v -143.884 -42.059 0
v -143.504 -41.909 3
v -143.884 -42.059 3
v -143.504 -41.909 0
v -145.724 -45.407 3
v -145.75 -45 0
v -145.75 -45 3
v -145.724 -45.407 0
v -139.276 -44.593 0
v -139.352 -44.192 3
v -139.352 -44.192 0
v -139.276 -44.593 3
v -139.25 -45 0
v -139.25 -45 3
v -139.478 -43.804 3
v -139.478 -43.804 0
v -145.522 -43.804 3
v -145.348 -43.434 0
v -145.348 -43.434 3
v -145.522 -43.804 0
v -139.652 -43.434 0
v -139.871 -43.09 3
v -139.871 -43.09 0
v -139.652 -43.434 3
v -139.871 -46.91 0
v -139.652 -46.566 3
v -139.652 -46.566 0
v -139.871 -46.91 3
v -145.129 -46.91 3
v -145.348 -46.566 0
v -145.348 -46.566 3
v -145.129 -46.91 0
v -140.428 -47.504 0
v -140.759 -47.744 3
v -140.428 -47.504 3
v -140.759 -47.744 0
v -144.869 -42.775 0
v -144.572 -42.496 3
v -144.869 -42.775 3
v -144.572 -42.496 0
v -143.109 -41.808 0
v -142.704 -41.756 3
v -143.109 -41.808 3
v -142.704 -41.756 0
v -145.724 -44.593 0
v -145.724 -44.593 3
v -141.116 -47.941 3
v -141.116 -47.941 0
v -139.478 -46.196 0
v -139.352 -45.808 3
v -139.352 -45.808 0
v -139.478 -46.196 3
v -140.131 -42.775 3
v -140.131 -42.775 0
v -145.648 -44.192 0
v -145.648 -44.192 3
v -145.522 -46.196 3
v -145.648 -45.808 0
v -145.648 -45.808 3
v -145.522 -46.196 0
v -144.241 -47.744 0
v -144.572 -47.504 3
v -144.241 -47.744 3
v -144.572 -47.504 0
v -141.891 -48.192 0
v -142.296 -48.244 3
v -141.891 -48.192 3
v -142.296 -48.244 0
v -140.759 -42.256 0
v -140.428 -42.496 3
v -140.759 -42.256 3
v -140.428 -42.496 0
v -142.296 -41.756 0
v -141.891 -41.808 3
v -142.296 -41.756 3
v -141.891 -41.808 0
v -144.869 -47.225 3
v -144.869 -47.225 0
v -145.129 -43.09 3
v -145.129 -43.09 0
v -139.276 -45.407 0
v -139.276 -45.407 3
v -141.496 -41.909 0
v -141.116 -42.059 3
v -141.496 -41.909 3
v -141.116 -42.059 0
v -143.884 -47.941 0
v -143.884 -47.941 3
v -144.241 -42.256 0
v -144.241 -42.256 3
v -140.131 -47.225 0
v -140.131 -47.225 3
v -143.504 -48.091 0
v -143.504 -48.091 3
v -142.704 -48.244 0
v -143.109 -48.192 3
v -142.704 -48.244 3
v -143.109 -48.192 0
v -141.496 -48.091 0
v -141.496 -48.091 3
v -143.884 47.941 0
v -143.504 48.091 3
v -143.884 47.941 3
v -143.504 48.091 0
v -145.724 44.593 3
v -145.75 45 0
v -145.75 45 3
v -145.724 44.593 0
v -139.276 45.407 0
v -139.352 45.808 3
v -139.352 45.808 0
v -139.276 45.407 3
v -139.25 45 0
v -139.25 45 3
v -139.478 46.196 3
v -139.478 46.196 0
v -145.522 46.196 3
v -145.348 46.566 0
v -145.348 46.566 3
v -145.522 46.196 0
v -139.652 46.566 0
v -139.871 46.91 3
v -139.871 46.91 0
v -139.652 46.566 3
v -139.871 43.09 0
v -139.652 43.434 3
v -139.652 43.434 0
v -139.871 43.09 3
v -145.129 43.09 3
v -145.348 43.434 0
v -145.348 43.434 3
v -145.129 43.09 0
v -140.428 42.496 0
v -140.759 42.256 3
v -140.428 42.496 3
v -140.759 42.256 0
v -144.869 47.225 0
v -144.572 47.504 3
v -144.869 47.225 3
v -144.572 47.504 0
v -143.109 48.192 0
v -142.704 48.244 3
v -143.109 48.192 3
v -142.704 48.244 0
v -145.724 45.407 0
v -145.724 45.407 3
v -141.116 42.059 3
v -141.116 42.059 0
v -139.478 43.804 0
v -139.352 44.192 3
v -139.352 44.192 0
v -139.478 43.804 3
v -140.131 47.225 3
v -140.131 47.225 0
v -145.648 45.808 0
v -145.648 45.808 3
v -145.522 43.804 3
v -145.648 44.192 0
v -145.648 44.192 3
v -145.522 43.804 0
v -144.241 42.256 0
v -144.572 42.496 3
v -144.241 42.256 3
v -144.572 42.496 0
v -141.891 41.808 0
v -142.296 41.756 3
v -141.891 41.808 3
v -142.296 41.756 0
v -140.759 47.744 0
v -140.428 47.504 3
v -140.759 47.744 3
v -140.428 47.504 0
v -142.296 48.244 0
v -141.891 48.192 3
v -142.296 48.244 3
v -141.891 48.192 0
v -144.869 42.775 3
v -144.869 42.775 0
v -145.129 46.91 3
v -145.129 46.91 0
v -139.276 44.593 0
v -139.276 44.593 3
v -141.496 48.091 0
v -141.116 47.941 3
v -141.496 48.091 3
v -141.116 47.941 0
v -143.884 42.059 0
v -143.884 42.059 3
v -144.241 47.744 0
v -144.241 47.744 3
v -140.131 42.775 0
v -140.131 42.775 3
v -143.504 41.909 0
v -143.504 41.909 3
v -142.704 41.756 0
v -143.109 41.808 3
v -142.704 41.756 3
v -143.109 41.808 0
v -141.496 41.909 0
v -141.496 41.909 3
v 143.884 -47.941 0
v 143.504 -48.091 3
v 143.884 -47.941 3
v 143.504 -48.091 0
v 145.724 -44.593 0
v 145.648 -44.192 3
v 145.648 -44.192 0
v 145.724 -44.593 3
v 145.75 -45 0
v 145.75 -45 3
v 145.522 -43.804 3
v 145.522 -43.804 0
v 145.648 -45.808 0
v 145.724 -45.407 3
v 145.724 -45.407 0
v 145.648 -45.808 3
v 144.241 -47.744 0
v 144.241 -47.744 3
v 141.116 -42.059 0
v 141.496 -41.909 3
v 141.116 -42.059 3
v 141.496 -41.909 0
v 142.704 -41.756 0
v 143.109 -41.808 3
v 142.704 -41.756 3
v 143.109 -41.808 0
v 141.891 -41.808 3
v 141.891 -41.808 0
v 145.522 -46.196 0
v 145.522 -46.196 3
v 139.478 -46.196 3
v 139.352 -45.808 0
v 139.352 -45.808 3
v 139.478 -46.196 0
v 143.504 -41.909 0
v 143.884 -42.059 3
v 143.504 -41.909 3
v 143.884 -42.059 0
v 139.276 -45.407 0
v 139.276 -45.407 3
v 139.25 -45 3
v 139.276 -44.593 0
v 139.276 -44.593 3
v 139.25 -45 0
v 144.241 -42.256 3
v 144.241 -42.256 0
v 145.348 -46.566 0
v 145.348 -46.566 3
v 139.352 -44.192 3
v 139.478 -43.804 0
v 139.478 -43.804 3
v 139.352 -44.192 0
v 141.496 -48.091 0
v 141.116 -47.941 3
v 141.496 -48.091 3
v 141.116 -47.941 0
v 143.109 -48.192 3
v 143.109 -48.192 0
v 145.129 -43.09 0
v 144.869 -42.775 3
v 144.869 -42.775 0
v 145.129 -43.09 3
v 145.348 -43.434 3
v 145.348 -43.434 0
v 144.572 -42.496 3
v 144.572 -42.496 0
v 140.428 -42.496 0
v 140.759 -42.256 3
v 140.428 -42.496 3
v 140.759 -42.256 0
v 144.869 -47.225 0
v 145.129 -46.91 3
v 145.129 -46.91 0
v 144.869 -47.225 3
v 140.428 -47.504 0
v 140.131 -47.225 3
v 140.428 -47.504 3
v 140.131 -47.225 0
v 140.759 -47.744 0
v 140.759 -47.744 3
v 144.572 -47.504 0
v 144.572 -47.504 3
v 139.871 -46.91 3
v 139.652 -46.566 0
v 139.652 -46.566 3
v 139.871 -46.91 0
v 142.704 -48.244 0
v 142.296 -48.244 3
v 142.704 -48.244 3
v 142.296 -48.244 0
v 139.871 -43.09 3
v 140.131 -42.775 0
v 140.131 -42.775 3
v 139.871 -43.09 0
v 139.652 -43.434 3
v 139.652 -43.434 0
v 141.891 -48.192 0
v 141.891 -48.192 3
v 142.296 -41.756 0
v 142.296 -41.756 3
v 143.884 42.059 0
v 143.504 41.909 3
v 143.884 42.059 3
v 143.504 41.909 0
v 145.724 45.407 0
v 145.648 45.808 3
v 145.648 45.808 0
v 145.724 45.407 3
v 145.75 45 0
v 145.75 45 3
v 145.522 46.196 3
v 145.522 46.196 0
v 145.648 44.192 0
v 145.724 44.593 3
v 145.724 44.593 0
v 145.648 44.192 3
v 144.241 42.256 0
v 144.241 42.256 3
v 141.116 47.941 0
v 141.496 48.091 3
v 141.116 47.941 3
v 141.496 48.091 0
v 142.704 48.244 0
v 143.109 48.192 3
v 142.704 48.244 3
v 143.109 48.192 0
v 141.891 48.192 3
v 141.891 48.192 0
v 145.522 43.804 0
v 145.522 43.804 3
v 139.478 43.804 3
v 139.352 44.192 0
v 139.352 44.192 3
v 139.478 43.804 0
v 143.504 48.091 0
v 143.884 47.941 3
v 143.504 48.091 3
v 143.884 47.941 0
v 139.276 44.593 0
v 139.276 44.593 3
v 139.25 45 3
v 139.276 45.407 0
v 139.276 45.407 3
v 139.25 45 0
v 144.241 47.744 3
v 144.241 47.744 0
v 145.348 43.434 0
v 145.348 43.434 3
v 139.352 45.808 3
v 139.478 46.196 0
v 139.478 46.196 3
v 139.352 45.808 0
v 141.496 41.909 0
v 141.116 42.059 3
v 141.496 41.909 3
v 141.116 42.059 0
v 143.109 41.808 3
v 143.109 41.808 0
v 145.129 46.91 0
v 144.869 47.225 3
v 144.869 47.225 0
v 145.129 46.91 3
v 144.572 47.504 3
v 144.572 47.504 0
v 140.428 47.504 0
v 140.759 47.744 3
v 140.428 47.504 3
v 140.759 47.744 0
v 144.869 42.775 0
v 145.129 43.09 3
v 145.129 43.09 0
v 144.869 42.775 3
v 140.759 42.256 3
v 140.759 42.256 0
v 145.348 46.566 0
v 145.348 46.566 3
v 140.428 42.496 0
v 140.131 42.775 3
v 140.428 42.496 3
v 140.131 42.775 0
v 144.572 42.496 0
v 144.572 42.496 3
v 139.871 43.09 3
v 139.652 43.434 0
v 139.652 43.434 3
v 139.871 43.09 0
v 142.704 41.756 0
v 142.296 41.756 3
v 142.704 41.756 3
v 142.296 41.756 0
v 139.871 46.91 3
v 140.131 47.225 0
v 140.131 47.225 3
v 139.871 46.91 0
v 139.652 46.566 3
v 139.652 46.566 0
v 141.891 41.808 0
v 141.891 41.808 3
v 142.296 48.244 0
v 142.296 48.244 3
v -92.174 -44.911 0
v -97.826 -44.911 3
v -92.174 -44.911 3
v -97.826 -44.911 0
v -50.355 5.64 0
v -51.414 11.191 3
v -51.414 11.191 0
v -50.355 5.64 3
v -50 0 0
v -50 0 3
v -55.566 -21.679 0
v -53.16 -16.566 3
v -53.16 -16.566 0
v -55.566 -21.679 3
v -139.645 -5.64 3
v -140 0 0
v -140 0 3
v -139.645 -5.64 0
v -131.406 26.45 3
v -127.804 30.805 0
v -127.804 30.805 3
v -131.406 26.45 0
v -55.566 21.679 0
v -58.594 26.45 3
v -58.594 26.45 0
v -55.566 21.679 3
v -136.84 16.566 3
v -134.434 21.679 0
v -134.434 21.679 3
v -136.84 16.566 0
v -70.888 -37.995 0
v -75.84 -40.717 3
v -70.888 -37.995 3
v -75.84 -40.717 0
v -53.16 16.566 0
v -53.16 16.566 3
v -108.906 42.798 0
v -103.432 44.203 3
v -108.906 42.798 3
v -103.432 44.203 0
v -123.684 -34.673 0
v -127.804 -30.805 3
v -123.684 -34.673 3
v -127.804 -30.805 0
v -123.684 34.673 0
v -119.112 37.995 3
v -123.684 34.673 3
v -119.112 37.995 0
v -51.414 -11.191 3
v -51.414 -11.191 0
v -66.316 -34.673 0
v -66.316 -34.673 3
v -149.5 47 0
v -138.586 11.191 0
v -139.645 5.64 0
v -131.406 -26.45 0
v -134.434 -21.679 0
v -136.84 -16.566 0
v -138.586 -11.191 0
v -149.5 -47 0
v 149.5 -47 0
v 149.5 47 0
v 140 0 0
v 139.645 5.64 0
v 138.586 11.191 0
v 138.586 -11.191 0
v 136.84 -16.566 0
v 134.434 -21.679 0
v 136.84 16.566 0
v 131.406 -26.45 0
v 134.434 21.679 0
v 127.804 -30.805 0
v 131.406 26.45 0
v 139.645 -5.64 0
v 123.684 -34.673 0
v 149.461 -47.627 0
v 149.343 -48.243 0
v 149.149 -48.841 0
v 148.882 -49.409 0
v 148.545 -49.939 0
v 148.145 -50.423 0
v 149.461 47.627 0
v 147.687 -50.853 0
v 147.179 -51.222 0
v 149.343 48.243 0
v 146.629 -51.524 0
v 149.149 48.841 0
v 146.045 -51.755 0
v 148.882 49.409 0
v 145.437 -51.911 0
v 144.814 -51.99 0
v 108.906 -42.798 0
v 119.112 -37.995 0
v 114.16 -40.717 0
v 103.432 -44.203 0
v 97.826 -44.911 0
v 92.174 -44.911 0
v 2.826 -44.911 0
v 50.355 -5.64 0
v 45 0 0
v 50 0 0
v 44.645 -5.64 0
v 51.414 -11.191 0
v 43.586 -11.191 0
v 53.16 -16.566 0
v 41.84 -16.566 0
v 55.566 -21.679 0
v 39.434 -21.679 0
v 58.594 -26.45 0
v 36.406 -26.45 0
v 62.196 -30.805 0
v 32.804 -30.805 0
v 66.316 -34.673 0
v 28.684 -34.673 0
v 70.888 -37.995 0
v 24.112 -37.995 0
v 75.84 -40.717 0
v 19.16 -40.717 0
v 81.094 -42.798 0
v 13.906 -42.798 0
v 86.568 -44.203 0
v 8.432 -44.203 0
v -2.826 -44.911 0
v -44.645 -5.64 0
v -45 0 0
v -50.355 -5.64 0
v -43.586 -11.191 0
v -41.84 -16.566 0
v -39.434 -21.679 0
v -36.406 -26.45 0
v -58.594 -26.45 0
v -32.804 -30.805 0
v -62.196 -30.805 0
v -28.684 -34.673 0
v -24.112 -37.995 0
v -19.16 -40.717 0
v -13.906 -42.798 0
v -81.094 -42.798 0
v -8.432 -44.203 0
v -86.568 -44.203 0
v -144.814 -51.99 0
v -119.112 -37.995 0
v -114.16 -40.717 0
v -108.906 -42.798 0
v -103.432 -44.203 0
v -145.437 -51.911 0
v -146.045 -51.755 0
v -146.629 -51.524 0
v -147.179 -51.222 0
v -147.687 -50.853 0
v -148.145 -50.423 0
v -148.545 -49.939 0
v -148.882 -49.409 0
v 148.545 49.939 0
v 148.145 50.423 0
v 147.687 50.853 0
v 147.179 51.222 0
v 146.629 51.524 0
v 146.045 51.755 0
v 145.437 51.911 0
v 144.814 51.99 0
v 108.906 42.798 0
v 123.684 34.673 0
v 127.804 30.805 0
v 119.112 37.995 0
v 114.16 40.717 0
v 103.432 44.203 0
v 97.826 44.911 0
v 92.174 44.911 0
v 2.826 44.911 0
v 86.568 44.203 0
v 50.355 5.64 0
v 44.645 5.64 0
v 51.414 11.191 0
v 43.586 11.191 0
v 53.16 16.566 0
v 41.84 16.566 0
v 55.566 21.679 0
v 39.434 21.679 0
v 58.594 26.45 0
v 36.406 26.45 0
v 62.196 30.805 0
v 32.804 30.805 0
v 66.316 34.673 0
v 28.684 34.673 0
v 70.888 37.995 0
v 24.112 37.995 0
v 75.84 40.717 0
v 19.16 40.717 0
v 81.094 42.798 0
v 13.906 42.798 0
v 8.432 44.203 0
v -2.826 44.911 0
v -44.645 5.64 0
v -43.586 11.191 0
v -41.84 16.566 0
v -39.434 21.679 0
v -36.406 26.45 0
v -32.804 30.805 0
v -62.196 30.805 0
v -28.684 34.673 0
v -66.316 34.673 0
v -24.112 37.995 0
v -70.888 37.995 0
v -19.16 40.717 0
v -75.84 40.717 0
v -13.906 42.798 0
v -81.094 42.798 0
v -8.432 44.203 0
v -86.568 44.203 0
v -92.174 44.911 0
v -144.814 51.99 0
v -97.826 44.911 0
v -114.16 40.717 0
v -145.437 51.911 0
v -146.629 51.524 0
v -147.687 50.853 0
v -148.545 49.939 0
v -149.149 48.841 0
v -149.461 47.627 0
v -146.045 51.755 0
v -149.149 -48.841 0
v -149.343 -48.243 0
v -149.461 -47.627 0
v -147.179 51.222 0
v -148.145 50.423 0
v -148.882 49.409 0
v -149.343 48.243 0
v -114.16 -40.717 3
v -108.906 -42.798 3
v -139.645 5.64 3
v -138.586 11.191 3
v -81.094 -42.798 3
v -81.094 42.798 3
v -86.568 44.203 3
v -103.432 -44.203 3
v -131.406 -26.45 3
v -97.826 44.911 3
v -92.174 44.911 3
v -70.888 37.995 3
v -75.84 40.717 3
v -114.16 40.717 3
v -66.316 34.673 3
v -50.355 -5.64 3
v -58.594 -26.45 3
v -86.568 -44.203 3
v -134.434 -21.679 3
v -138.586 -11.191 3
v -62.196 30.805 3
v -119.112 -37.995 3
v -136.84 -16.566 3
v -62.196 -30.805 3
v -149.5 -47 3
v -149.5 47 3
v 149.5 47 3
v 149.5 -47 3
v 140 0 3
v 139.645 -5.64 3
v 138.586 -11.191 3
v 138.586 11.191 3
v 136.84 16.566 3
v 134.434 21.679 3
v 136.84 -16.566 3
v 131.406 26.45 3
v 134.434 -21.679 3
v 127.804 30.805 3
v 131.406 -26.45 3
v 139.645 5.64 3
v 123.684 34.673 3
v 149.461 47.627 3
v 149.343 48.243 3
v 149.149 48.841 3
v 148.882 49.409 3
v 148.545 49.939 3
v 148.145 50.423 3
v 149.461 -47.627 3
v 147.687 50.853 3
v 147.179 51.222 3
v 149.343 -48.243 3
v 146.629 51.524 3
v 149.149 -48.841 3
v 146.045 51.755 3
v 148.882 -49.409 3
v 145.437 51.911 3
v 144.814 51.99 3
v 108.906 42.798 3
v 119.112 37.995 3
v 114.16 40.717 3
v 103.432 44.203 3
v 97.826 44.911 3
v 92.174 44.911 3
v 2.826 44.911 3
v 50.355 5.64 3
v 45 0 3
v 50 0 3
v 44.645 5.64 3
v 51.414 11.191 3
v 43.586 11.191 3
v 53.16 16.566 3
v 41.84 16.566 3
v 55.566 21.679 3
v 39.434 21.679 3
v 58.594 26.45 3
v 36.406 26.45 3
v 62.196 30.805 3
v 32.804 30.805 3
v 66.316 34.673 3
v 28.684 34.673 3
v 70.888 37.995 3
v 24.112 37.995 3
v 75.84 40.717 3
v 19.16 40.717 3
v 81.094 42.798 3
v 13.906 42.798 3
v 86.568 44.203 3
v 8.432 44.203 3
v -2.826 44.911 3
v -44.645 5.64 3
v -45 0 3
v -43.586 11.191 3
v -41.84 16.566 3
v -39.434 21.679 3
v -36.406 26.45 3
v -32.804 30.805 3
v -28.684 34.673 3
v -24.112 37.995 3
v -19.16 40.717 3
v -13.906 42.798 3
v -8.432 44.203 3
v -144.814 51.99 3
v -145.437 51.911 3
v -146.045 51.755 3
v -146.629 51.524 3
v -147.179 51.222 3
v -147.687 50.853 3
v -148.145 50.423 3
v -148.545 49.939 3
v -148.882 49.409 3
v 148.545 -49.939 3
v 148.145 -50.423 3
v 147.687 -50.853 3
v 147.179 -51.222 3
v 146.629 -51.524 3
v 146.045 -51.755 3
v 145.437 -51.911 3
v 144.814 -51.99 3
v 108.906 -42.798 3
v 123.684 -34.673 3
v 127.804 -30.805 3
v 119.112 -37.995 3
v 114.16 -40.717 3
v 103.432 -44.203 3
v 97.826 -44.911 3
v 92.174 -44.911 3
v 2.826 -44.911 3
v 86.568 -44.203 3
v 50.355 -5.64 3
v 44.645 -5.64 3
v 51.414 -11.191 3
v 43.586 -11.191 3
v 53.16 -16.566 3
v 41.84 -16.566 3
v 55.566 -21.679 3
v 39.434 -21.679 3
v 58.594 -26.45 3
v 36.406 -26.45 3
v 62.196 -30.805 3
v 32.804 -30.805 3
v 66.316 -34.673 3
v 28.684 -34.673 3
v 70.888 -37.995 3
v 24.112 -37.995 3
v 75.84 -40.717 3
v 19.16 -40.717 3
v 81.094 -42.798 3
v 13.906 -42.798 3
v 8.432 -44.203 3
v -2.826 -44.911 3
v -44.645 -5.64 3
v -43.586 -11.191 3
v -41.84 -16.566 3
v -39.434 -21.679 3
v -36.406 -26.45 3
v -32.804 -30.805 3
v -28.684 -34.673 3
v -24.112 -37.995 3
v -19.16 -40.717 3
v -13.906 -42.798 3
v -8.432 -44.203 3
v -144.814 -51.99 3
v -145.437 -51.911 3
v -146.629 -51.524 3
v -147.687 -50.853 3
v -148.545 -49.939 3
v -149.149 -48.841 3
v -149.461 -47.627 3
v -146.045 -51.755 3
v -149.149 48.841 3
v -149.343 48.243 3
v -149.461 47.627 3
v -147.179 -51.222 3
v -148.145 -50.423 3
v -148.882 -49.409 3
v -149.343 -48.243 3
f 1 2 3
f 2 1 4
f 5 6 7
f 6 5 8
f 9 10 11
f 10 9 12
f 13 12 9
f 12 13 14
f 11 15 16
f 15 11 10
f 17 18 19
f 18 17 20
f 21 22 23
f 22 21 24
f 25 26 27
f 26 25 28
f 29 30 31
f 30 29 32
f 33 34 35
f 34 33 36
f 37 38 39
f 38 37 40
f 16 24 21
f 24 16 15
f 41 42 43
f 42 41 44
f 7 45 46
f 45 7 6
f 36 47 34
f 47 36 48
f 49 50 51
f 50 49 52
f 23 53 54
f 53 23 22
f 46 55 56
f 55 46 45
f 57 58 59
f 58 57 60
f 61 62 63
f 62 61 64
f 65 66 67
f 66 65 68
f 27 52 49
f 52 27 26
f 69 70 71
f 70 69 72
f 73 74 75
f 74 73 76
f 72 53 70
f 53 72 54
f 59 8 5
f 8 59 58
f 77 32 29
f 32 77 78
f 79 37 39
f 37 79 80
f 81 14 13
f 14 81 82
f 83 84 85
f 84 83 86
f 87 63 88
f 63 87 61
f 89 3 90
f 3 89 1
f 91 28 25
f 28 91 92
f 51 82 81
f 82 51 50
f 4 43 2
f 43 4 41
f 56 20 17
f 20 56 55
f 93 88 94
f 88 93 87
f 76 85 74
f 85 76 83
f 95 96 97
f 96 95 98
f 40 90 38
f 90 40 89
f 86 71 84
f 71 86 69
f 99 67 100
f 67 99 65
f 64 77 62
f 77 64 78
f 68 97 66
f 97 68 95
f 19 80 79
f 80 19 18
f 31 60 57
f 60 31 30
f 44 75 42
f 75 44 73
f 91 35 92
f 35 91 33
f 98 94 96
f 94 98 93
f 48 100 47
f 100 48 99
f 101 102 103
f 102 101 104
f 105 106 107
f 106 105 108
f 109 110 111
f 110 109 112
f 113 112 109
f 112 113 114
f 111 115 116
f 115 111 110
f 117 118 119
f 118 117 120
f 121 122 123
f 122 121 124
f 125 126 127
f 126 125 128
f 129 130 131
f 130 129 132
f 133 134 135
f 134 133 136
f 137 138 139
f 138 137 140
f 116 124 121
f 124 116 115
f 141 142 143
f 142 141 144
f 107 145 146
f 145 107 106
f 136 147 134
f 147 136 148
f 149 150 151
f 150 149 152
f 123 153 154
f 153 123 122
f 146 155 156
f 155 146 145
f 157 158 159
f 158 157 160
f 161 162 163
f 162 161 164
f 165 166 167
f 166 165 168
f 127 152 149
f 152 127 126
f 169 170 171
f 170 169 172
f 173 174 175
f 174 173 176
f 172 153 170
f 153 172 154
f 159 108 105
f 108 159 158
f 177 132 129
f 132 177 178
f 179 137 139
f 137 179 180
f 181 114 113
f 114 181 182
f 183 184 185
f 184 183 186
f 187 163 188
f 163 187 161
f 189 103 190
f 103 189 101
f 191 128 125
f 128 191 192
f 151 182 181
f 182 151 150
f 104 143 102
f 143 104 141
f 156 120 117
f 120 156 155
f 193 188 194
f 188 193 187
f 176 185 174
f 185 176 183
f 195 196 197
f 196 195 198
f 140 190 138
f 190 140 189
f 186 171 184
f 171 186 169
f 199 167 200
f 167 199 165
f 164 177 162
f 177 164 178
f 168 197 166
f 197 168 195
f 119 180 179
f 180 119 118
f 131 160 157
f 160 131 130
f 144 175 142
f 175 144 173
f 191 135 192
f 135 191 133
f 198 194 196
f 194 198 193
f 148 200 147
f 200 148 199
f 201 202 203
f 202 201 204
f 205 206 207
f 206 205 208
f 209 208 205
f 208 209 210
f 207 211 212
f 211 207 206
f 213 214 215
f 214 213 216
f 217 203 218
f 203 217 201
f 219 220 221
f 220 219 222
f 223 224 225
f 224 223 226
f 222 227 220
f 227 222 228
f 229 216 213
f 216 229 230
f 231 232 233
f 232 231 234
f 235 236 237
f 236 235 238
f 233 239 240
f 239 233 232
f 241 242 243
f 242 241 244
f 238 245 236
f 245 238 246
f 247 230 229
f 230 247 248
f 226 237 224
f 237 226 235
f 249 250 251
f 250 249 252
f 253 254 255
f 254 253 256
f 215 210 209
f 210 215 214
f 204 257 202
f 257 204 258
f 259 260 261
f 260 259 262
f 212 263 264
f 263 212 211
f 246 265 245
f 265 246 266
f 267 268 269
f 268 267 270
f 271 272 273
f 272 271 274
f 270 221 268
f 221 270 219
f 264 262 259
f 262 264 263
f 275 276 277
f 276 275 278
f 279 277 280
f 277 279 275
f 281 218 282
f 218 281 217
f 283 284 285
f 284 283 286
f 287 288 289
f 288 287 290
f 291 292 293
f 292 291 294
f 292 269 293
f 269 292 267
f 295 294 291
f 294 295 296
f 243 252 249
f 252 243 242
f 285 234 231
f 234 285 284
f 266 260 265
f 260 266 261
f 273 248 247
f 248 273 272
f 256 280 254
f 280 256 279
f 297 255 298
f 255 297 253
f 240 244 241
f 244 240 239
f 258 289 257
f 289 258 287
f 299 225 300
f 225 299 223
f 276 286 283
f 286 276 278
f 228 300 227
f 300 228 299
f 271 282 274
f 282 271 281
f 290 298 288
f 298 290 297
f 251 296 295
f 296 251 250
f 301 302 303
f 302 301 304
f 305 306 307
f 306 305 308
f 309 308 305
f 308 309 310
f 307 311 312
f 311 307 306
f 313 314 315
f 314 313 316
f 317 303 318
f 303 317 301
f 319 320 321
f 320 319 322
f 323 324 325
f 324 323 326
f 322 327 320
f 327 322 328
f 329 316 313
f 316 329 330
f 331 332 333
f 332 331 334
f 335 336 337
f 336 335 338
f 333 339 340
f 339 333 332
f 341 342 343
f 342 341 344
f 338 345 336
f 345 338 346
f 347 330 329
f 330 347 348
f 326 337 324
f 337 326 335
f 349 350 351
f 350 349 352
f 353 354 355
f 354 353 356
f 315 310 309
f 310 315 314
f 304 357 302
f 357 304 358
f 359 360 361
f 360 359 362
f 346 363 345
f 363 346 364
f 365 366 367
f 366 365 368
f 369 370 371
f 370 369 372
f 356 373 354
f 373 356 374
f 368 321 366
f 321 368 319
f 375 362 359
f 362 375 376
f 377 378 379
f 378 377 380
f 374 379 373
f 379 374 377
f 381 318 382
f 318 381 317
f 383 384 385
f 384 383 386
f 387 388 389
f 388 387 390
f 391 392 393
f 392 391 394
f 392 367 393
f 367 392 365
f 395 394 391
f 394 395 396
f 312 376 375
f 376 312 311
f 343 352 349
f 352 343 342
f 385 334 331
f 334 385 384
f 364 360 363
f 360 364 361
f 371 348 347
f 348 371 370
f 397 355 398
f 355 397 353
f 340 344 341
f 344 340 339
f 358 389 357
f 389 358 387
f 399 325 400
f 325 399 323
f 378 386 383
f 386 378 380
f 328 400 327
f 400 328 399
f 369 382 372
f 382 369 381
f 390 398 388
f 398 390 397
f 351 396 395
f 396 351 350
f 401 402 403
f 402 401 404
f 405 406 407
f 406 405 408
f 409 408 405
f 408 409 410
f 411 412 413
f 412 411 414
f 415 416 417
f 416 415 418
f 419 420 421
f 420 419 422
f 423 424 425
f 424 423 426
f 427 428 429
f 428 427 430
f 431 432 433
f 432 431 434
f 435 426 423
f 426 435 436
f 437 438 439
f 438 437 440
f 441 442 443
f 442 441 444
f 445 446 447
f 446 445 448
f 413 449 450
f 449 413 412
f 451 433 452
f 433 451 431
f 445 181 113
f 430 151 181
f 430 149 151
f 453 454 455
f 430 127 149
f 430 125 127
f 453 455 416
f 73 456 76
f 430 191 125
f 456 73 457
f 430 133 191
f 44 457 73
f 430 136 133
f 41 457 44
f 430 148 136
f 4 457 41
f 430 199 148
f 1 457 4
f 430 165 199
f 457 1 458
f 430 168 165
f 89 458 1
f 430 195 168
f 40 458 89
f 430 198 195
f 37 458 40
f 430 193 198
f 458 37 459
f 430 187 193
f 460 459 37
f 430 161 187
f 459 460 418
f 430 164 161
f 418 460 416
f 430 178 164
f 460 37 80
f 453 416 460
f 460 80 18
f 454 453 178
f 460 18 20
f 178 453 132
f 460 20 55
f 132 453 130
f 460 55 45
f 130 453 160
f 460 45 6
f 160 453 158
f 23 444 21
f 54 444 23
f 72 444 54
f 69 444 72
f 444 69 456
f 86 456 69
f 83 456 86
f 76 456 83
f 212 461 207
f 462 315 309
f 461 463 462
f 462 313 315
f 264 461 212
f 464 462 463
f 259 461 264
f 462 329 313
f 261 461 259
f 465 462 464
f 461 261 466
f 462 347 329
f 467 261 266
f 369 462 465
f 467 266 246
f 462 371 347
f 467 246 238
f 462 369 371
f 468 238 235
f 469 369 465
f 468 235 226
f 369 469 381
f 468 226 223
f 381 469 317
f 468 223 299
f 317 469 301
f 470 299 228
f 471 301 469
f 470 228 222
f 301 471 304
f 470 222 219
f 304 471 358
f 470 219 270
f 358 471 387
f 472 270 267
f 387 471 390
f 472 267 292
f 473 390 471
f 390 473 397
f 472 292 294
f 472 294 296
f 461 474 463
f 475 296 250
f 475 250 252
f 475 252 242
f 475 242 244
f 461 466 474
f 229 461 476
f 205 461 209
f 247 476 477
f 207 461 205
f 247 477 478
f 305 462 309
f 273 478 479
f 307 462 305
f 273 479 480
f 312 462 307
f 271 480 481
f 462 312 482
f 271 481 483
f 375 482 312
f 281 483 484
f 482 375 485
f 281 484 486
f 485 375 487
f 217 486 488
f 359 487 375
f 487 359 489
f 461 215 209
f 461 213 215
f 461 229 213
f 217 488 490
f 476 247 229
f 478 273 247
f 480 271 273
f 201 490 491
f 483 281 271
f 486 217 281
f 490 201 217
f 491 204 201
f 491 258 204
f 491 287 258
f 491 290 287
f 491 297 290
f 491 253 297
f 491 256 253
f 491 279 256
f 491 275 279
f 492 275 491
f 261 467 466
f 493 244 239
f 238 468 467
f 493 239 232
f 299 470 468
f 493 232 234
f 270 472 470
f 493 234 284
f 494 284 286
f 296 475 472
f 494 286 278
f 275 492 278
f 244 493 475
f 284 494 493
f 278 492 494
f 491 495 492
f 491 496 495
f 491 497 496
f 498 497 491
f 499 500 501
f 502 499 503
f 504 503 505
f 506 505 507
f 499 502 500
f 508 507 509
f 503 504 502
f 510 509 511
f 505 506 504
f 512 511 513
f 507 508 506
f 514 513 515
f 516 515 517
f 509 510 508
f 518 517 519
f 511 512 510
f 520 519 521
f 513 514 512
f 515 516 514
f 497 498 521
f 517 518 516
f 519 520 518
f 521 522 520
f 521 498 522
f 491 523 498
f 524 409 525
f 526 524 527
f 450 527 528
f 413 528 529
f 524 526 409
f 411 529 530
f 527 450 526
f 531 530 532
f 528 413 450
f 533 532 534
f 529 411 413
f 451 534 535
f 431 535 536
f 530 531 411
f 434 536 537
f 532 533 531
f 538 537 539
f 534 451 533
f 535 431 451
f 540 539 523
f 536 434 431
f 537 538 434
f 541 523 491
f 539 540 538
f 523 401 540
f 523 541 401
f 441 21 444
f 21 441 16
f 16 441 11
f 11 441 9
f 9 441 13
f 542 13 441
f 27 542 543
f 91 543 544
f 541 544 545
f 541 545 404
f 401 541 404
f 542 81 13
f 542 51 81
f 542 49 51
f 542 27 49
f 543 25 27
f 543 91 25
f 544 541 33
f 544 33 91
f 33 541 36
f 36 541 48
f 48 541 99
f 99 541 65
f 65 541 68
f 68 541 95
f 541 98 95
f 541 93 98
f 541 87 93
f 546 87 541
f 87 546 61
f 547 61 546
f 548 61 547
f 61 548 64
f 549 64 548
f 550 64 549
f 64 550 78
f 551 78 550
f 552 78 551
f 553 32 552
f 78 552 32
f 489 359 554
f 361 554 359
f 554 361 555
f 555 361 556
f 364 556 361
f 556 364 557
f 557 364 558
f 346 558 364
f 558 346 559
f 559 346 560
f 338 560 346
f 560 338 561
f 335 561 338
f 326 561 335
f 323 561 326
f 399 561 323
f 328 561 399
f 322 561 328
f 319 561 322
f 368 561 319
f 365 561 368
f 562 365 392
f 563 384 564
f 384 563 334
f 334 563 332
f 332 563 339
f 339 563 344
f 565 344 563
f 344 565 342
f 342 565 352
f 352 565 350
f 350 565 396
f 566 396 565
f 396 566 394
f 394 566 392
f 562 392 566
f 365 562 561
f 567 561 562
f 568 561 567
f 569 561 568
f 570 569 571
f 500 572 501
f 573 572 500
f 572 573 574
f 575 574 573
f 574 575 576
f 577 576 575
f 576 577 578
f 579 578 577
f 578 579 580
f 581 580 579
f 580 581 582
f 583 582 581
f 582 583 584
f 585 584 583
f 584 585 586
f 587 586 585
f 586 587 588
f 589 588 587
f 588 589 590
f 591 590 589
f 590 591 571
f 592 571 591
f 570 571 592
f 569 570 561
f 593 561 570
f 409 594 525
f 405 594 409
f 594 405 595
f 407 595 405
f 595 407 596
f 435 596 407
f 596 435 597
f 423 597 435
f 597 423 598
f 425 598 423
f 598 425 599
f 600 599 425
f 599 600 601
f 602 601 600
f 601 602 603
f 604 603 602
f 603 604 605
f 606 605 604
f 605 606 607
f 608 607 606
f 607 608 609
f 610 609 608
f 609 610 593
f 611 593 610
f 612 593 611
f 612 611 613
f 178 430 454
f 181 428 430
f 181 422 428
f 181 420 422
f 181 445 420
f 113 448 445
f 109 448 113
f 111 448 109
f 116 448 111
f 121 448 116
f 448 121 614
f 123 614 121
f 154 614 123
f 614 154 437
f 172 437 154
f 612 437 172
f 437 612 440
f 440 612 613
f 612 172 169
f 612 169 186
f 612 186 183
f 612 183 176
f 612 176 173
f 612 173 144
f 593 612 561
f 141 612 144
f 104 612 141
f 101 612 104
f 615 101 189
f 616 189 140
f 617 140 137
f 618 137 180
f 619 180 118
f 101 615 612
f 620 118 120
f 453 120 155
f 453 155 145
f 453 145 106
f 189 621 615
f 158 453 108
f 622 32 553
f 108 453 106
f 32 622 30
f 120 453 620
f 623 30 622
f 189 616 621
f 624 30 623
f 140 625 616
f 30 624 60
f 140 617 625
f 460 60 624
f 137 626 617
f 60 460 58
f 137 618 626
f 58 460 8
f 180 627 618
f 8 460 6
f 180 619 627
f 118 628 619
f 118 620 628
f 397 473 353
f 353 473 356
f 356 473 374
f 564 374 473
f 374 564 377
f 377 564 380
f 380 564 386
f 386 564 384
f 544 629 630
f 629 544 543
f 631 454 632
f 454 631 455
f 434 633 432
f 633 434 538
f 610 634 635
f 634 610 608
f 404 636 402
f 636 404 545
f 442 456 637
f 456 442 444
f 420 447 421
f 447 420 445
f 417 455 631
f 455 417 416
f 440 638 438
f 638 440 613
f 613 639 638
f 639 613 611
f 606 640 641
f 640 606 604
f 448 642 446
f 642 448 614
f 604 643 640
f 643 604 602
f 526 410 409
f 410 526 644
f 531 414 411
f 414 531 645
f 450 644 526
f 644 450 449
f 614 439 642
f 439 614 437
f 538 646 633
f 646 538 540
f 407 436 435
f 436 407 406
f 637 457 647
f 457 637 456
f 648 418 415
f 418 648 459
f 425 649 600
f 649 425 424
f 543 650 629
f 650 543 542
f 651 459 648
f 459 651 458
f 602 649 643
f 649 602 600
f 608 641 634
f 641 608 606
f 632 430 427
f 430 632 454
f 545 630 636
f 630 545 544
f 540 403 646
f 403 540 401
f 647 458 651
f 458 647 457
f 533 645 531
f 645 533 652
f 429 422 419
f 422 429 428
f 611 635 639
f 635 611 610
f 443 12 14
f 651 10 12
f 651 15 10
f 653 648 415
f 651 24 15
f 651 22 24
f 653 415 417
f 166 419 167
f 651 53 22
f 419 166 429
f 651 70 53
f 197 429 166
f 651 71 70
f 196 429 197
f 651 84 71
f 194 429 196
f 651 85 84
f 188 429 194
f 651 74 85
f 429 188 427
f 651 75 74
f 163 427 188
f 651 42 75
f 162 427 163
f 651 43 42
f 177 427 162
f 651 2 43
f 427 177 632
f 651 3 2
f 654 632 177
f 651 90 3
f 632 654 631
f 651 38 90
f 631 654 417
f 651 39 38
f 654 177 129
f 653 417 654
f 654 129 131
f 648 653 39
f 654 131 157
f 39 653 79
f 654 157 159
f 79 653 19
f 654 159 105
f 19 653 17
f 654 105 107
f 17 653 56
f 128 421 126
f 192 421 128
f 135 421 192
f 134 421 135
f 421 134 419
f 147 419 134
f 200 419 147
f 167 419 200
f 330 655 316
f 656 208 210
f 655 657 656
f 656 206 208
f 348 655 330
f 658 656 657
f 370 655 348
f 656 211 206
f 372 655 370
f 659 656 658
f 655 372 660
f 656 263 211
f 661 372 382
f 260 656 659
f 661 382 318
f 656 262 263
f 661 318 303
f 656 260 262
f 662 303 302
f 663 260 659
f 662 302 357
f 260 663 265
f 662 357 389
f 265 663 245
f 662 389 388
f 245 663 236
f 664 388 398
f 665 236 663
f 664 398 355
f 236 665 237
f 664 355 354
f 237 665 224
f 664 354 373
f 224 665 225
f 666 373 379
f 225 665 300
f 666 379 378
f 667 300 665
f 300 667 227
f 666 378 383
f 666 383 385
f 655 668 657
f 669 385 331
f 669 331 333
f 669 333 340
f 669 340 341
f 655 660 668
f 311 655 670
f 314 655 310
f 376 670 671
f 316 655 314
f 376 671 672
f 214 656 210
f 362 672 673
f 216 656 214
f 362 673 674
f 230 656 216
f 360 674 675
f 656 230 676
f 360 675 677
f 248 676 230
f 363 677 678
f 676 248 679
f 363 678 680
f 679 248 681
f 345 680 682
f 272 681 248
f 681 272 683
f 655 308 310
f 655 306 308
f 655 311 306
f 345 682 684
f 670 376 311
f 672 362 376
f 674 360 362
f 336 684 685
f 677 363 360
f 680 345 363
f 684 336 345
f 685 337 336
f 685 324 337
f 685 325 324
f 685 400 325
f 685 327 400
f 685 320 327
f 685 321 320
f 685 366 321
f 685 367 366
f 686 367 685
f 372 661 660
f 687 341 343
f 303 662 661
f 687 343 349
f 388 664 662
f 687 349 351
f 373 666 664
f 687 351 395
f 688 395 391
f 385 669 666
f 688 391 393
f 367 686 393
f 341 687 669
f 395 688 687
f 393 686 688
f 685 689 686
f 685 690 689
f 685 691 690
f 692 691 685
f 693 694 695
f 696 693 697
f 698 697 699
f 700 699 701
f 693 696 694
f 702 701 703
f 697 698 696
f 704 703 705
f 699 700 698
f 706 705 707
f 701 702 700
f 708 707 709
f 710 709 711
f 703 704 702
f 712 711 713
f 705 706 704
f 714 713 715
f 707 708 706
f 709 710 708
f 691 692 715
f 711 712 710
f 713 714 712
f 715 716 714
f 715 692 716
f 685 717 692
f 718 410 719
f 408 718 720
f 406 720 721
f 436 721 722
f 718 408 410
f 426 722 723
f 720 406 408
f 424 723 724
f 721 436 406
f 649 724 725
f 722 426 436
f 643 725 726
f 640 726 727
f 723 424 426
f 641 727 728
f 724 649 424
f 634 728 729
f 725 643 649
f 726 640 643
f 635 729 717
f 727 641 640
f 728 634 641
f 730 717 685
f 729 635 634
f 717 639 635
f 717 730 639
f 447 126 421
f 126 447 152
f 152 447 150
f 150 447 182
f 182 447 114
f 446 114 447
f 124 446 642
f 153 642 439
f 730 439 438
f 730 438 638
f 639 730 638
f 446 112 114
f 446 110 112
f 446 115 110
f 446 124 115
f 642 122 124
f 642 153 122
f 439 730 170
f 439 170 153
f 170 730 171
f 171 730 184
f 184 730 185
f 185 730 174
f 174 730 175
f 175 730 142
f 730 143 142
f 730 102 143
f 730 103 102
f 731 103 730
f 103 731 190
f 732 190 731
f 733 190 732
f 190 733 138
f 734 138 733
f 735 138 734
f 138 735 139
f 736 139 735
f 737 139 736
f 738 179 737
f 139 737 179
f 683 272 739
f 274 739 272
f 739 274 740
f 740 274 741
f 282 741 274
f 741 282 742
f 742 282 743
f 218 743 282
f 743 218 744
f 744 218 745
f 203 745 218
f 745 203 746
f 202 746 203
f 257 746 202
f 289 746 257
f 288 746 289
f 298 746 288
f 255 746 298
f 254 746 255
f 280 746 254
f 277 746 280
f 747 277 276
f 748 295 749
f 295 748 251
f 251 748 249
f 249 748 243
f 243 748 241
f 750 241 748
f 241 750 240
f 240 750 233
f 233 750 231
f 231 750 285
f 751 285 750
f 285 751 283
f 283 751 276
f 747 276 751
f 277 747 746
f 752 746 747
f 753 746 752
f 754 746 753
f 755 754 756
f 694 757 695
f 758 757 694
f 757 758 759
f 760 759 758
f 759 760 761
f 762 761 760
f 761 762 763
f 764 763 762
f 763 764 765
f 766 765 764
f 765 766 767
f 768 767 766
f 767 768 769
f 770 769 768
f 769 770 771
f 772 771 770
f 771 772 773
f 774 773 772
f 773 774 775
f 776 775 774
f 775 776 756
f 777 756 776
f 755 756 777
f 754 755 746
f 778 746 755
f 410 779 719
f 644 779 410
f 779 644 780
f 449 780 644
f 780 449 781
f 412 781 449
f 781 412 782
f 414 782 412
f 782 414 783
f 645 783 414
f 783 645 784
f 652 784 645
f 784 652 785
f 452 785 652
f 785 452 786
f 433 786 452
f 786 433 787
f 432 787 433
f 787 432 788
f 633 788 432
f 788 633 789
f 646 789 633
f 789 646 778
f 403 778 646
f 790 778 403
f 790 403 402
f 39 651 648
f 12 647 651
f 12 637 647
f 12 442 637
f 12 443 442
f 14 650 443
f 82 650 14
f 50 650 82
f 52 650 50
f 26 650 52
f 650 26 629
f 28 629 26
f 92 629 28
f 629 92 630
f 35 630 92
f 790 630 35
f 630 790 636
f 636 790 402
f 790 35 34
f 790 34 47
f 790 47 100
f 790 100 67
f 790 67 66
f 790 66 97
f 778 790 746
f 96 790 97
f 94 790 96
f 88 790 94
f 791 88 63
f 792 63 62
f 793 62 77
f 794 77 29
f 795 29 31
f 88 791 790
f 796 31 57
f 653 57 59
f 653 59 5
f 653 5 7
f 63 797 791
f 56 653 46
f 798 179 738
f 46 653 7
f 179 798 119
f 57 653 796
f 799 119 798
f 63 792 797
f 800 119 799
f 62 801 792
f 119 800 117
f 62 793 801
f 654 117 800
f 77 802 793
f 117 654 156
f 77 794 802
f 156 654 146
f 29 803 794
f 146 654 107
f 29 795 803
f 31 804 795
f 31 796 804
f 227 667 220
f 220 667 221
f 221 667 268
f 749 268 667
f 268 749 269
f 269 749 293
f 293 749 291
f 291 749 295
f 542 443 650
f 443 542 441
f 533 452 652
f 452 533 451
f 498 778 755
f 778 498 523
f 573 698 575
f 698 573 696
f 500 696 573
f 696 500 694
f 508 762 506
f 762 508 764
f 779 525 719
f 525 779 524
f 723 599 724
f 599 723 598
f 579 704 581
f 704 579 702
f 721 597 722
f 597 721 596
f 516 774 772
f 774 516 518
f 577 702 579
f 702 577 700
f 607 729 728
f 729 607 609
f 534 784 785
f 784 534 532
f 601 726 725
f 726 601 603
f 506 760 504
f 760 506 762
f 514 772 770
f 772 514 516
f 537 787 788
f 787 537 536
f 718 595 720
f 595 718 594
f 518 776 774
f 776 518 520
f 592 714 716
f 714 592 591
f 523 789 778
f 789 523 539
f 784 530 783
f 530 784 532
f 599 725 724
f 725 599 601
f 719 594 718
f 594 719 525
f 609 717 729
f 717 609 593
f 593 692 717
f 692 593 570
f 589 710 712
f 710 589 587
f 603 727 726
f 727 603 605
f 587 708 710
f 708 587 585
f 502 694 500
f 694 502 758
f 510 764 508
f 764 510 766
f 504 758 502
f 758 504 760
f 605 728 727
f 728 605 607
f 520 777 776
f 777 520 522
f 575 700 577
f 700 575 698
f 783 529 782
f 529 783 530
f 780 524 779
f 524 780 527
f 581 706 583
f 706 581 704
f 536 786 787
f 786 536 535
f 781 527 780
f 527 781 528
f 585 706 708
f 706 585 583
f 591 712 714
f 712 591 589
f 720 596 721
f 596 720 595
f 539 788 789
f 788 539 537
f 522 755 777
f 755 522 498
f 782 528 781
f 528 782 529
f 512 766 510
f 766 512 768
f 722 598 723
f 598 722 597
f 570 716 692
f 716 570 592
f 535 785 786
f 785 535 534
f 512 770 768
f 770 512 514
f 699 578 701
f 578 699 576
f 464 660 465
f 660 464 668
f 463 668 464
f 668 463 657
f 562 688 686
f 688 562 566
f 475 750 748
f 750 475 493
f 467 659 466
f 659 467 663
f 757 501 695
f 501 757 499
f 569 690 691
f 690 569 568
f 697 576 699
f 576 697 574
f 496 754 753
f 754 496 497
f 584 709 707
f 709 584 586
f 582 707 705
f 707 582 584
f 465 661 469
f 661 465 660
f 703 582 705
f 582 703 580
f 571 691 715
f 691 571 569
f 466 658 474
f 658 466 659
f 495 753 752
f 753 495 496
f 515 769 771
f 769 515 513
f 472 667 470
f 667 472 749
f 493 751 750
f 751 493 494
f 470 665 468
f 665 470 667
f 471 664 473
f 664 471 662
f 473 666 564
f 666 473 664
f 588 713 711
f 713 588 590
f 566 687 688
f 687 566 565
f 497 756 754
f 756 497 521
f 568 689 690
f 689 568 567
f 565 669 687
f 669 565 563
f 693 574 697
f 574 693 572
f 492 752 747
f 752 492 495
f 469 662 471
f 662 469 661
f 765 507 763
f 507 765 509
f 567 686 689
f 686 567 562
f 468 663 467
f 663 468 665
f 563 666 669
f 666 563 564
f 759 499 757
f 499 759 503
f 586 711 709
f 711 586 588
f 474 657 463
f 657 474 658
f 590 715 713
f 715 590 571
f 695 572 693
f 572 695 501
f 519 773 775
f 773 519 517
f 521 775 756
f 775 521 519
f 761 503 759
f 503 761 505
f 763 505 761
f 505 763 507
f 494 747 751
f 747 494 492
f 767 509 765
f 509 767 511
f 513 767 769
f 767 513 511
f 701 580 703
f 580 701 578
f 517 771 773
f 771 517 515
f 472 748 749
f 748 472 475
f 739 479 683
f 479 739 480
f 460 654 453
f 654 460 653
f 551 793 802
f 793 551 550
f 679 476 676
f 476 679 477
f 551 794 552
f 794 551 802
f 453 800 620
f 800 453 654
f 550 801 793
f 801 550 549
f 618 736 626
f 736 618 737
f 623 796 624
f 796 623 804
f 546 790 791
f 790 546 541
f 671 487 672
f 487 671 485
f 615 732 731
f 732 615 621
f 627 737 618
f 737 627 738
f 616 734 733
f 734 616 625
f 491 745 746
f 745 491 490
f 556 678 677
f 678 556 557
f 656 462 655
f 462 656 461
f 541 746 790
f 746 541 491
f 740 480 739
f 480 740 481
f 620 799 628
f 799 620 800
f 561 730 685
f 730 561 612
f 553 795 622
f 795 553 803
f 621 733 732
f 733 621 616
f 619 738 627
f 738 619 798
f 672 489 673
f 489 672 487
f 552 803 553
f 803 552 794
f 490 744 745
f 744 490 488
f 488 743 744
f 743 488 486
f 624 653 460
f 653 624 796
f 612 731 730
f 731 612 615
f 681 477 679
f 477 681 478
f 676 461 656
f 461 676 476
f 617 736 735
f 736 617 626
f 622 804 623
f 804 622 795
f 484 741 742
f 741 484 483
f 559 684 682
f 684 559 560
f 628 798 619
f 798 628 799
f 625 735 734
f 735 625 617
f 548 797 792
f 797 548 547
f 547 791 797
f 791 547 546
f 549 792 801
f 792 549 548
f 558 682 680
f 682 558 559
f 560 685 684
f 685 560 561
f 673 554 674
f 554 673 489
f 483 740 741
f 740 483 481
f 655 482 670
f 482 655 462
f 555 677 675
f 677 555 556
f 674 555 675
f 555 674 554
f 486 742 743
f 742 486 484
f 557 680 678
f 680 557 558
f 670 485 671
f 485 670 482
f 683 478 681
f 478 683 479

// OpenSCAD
$fn = 50;


difference() {
	union() {
		hull() {
			translate(v = [-144.5000000000, 47.0000000000, 0]) {
				cylinder(h = 3, r = 5);
			}
			translate(v = [144.5000000000, 47.0000000000, 0]) {
				cylinder(h = 3, r = 5);
			}
			translate(v = [-144.5000000000, -47.0000000000, 0]) {
				cylinder(h = 3, r = 5);
			}
			translate(v = [144.5000000000, -47.0000000000, 0]) {
				cylinder(h = 3, r = 5);
			}
		}
	}
	union() {
		#translate(v = [-142.5000000000, -45.0000000000, -100.0000000000]) {
			cylinder(h = 200, r = 3.2500000000);
		}
		#translate(v = [-142.5000000000, 45.0000000000, -100.0000000000]) {
			cylinder(h = 200, r = 3.2500000000);
		}
		#translate(v = [142.5000000000, -45.0000000000, -100.0000000000]) {
			cylinder(h = 200, r = 3.2500000000);
		}
		#translate(v = [142.5000000000, 45.0000000000, -100.0000000000]) {
			cylinder(h = 200, r = 3.2500000000);
		}
		#translate(v = [-95.0000000000, 0, 0]) {
			cylinder(h = 3, r = 45.0000000000);
		}
		#cylinder(h = 3, r = 45.0000000000);
		#translate(v = [95.0000000000, 0, 0]) {
			cylinder(h = 3, r = 45.0000000000);
		}
	}
}
